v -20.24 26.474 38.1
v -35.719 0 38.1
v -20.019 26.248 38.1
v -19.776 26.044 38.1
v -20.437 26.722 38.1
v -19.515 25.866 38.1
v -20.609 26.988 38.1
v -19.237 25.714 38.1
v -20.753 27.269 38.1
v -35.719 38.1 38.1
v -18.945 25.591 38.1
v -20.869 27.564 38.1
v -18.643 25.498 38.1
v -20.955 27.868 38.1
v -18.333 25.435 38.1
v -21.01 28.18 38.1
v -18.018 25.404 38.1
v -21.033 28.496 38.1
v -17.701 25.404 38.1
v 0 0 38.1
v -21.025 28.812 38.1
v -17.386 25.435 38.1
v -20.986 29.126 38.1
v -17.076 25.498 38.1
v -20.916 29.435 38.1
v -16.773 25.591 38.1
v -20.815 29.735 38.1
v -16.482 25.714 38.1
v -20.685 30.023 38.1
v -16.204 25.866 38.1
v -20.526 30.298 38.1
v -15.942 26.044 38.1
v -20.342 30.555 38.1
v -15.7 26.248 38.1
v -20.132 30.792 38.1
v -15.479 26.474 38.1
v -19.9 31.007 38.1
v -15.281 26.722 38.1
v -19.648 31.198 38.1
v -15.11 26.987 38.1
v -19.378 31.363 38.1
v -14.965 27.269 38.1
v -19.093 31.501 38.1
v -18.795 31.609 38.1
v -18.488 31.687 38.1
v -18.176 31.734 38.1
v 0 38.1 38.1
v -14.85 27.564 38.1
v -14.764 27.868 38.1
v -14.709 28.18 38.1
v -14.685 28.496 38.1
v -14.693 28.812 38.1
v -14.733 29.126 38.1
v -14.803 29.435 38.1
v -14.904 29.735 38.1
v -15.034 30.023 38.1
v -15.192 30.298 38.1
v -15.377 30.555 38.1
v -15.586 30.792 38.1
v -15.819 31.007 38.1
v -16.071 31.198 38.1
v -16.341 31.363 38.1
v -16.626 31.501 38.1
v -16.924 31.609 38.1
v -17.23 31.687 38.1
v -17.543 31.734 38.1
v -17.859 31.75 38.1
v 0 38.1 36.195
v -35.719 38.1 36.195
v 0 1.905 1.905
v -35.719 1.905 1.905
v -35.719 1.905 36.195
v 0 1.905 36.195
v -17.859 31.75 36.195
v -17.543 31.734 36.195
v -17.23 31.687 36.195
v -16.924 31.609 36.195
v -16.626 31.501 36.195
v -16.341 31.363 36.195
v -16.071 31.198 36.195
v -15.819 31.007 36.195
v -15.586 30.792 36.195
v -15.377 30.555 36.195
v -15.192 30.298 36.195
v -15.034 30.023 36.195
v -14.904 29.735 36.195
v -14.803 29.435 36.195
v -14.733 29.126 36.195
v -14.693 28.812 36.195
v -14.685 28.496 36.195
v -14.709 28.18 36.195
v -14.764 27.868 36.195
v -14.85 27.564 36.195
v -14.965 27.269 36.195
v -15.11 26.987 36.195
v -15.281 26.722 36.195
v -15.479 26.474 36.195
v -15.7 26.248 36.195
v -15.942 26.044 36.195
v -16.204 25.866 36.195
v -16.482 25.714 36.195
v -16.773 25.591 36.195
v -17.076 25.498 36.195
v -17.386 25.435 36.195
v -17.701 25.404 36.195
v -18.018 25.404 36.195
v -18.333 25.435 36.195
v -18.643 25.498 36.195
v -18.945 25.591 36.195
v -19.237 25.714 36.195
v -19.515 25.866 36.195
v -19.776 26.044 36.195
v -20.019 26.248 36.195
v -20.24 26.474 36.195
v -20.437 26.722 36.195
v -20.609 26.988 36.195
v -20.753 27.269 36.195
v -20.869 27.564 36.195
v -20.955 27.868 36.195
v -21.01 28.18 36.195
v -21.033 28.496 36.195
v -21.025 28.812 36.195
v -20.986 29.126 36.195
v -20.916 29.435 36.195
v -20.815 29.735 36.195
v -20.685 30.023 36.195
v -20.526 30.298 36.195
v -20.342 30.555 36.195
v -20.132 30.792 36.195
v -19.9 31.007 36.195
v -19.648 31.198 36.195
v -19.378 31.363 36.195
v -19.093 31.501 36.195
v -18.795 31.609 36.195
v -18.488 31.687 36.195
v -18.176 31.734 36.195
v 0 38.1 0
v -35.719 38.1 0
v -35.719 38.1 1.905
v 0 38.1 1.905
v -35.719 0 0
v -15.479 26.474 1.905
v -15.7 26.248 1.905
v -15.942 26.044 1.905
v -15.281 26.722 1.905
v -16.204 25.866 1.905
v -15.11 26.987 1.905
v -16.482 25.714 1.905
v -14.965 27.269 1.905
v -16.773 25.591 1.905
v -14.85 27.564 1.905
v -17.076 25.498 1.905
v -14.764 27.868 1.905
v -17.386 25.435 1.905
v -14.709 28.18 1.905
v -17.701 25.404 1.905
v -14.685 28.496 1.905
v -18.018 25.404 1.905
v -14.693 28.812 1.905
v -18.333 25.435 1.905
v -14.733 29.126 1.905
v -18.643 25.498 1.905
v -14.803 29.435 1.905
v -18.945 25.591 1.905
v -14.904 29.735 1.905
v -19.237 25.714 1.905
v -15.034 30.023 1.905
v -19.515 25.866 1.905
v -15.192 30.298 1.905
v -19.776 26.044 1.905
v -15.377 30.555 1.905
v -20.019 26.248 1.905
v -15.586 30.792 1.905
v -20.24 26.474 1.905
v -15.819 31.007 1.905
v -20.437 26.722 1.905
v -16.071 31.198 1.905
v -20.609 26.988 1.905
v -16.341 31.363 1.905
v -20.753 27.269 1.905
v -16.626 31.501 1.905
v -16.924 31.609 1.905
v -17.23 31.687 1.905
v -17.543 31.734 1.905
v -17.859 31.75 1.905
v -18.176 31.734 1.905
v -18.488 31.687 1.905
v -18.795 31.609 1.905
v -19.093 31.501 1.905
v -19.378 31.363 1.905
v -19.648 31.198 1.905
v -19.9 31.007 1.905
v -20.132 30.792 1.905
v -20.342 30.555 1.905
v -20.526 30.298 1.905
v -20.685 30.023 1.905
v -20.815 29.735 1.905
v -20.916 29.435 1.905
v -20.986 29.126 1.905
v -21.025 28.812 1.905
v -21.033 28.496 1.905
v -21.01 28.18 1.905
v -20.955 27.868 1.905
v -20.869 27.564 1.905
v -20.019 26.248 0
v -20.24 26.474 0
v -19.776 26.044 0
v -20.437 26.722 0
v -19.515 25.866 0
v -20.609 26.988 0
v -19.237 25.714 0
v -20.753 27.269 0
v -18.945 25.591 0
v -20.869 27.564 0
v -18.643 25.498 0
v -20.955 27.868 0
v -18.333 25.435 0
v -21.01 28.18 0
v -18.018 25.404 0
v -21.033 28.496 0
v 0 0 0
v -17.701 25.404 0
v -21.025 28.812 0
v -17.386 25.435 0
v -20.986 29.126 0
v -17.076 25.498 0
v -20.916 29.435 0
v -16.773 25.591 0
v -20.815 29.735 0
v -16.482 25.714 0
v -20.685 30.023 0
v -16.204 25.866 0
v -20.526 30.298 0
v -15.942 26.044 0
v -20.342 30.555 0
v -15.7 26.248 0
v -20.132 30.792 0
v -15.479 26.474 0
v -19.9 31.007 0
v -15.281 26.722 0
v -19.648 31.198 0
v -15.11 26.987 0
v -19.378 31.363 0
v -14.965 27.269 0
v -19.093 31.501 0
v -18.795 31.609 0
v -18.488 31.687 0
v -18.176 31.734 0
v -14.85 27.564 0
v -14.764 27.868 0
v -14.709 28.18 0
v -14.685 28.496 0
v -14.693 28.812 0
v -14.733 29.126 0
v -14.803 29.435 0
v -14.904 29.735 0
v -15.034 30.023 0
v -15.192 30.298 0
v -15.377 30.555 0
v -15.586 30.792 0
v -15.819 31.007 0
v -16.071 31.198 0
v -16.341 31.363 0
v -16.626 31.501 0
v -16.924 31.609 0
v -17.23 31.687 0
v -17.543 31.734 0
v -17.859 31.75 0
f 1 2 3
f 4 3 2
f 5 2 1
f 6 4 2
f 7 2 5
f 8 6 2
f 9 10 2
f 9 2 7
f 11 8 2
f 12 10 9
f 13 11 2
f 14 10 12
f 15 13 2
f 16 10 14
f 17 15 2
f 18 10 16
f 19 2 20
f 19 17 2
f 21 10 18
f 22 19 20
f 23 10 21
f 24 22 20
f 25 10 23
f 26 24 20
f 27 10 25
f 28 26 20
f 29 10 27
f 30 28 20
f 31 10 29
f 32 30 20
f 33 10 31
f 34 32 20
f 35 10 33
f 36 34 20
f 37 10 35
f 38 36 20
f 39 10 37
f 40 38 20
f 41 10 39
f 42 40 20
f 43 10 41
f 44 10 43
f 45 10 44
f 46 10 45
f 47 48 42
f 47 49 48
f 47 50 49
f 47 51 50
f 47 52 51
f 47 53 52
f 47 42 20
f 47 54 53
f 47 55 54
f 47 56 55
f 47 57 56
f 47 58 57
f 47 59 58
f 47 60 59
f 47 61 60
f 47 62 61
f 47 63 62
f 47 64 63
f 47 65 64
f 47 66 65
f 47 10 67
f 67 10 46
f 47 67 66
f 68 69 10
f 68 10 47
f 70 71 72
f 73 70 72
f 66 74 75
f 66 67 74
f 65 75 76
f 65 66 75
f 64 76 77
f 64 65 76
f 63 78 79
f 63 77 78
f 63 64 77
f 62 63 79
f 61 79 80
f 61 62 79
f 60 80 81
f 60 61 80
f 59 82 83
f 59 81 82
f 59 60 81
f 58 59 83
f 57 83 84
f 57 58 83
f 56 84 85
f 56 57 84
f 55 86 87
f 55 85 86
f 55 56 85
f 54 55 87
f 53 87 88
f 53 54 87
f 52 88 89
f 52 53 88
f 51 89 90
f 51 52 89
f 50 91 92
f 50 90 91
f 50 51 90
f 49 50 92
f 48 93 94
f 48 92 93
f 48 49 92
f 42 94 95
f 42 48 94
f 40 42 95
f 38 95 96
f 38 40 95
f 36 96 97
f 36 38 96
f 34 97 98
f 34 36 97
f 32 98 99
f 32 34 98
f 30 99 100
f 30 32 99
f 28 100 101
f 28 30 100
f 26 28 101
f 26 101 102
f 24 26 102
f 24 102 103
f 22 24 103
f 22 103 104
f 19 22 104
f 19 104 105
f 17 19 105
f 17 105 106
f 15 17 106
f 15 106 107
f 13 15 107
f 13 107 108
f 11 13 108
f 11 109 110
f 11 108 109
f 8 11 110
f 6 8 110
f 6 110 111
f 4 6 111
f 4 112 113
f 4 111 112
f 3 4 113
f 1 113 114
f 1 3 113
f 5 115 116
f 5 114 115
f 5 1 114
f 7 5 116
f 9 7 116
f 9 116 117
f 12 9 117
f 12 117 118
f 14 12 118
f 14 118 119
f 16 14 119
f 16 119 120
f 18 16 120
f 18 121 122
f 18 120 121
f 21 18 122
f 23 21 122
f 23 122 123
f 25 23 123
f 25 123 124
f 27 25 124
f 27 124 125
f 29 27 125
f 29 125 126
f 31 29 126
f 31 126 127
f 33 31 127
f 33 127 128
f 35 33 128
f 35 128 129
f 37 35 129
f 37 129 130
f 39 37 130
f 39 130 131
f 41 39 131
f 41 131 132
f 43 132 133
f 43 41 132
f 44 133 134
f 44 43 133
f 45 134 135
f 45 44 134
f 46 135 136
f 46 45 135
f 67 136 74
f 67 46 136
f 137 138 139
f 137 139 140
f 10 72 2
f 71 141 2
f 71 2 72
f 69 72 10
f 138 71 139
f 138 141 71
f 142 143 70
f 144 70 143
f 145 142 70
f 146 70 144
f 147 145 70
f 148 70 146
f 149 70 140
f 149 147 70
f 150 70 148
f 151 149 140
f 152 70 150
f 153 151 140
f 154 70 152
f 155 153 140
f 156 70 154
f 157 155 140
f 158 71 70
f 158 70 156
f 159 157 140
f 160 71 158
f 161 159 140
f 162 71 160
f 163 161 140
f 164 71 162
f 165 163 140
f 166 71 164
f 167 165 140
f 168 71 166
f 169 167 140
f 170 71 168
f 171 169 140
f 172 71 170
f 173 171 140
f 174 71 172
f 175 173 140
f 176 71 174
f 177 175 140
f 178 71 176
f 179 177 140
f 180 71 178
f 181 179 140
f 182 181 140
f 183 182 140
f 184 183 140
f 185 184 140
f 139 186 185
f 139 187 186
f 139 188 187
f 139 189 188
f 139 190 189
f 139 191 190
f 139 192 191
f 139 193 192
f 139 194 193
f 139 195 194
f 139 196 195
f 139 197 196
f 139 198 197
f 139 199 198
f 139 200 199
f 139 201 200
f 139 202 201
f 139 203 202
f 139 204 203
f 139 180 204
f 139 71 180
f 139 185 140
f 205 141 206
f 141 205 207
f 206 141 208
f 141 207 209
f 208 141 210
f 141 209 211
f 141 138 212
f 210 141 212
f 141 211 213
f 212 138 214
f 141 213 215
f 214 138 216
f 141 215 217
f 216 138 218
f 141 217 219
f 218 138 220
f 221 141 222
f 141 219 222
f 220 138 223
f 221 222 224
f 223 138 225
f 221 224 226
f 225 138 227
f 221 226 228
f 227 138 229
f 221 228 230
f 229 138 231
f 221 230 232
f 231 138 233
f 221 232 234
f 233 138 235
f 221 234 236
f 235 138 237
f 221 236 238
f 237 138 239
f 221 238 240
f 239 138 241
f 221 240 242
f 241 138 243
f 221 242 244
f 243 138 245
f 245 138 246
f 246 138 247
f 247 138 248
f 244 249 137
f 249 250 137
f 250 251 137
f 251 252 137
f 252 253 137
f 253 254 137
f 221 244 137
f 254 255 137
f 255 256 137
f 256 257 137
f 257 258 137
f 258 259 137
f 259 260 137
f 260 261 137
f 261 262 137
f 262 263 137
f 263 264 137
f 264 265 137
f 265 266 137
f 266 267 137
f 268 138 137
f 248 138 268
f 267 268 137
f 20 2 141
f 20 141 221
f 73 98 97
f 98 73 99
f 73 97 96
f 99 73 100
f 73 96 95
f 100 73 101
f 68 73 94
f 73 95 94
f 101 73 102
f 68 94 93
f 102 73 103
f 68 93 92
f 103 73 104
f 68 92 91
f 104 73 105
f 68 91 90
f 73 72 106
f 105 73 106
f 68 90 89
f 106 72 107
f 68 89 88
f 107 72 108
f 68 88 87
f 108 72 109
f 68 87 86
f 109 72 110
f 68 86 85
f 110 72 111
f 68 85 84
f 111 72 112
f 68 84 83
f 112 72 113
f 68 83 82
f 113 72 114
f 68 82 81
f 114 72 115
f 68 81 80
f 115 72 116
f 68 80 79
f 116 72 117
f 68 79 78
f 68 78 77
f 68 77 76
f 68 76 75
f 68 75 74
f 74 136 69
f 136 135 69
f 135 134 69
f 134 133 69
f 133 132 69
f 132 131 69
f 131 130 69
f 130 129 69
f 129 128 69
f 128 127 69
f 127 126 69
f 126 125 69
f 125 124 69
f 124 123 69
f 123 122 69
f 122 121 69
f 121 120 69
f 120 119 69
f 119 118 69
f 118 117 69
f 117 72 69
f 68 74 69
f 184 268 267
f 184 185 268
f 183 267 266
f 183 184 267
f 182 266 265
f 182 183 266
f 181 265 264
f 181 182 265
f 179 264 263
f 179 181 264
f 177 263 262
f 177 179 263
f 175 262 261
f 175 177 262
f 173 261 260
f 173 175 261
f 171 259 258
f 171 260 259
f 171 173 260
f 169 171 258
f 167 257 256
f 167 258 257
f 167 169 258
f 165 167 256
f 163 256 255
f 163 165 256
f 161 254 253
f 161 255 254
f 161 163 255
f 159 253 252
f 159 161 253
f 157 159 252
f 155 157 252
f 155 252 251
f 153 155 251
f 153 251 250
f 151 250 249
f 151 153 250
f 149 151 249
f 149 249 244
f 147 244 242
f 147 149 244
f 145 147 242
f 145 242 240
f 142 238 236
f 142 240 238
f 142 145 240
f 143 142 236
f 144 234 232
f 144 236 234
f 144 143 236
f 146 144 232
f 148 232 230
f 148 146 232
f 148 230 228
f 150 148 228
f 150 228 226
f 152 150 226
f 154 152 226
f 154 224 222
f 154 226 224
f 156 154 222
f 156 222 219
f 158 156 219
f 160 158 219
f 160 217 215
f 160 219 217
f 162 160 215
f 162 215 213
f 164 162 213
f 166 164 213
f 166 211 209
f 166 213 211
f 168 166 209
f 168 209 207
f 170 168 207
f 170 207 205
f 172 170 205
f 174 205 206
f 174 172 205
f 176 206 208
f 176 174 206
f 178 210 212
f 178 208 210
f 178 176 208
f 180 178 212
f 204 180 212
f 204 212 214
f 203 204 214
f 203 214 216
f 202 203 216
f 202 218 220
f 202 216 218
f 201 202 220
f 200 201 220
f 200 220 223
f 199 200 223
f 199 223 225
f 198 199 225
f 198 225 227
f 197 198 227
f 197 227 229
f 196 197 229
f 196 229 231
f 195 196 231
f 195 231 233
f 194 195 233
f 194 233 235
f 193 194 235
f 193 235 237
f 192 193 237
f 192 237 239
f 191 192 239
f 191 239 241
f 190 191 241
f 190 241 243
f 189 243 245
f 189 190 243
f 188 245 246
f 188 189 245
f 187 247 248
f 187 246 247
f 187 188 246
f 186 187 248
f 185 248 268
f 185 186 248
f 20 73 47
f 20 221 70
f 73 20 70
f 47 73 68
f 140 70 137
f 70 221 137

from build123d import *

# Parameters (mm, degrees)
SKETCH1_W               = 35.71875
SKETCH1_H               = 38.1
BOSS_EXTRUDE1_DEPTH     = 38.1
SKETCH2_W               = 34.29
SKETCH2_H               = 36.195
CUT_EXTRUDE1_DEPTH      = 65.645565212
CUT_EXTRUDE2_DEPTH      = 64.541459903
CUT_EXTRUDE2_DEPTH_BACK = 64.541459903
SKETCH3_R               = 3.175


with BuildPart() as part:
    # Sketch1 → Boss-Extrude1 (new body)
    with BuildSketch(Plane.XY):
        with Locations((-17.859375, 19.05)):
            Rectangle(SKETCH1_W, SKETCH1_H)
    extrude(amount=BOSS_EXTRUDE1_DEPTH)

    # Sketch2 → Cut-Extrude1 (cut, through all)
    with BuildSketch(Plane.ZY.offset(35.71875)):
        with Locations((19.05, 20.0025)):
            Rectangle(SKETCH2_W, SKETCH2_H)
    extrude(amount=-CUT_EXTRUDE1_DEPTH, mode=Mode.SUBTRACT)

    # Sketch3 → Cut-Extrude2 (cut, two sides: drawn at the far end of the back side and taken through both)
    with BuildSketch(Plane(origin=(0, 0, 36.195), x_dir=(-1, 0, 0), z_dir=(0, 0, -1)).offset(-CUT_EXTRUDE2_DEPTH_BACK)):
        with Locations(Location((17.859375, 28.575, 0), (0, 0, 90))):
            Circle(SKETCH3_R)
    extrude(amount=CUT_EXTRUDE2_DEPTH + CUT_EXTRUDE2_DEPTH_BACK, mode=Mode.SUBTRACT)


solid = part.part
